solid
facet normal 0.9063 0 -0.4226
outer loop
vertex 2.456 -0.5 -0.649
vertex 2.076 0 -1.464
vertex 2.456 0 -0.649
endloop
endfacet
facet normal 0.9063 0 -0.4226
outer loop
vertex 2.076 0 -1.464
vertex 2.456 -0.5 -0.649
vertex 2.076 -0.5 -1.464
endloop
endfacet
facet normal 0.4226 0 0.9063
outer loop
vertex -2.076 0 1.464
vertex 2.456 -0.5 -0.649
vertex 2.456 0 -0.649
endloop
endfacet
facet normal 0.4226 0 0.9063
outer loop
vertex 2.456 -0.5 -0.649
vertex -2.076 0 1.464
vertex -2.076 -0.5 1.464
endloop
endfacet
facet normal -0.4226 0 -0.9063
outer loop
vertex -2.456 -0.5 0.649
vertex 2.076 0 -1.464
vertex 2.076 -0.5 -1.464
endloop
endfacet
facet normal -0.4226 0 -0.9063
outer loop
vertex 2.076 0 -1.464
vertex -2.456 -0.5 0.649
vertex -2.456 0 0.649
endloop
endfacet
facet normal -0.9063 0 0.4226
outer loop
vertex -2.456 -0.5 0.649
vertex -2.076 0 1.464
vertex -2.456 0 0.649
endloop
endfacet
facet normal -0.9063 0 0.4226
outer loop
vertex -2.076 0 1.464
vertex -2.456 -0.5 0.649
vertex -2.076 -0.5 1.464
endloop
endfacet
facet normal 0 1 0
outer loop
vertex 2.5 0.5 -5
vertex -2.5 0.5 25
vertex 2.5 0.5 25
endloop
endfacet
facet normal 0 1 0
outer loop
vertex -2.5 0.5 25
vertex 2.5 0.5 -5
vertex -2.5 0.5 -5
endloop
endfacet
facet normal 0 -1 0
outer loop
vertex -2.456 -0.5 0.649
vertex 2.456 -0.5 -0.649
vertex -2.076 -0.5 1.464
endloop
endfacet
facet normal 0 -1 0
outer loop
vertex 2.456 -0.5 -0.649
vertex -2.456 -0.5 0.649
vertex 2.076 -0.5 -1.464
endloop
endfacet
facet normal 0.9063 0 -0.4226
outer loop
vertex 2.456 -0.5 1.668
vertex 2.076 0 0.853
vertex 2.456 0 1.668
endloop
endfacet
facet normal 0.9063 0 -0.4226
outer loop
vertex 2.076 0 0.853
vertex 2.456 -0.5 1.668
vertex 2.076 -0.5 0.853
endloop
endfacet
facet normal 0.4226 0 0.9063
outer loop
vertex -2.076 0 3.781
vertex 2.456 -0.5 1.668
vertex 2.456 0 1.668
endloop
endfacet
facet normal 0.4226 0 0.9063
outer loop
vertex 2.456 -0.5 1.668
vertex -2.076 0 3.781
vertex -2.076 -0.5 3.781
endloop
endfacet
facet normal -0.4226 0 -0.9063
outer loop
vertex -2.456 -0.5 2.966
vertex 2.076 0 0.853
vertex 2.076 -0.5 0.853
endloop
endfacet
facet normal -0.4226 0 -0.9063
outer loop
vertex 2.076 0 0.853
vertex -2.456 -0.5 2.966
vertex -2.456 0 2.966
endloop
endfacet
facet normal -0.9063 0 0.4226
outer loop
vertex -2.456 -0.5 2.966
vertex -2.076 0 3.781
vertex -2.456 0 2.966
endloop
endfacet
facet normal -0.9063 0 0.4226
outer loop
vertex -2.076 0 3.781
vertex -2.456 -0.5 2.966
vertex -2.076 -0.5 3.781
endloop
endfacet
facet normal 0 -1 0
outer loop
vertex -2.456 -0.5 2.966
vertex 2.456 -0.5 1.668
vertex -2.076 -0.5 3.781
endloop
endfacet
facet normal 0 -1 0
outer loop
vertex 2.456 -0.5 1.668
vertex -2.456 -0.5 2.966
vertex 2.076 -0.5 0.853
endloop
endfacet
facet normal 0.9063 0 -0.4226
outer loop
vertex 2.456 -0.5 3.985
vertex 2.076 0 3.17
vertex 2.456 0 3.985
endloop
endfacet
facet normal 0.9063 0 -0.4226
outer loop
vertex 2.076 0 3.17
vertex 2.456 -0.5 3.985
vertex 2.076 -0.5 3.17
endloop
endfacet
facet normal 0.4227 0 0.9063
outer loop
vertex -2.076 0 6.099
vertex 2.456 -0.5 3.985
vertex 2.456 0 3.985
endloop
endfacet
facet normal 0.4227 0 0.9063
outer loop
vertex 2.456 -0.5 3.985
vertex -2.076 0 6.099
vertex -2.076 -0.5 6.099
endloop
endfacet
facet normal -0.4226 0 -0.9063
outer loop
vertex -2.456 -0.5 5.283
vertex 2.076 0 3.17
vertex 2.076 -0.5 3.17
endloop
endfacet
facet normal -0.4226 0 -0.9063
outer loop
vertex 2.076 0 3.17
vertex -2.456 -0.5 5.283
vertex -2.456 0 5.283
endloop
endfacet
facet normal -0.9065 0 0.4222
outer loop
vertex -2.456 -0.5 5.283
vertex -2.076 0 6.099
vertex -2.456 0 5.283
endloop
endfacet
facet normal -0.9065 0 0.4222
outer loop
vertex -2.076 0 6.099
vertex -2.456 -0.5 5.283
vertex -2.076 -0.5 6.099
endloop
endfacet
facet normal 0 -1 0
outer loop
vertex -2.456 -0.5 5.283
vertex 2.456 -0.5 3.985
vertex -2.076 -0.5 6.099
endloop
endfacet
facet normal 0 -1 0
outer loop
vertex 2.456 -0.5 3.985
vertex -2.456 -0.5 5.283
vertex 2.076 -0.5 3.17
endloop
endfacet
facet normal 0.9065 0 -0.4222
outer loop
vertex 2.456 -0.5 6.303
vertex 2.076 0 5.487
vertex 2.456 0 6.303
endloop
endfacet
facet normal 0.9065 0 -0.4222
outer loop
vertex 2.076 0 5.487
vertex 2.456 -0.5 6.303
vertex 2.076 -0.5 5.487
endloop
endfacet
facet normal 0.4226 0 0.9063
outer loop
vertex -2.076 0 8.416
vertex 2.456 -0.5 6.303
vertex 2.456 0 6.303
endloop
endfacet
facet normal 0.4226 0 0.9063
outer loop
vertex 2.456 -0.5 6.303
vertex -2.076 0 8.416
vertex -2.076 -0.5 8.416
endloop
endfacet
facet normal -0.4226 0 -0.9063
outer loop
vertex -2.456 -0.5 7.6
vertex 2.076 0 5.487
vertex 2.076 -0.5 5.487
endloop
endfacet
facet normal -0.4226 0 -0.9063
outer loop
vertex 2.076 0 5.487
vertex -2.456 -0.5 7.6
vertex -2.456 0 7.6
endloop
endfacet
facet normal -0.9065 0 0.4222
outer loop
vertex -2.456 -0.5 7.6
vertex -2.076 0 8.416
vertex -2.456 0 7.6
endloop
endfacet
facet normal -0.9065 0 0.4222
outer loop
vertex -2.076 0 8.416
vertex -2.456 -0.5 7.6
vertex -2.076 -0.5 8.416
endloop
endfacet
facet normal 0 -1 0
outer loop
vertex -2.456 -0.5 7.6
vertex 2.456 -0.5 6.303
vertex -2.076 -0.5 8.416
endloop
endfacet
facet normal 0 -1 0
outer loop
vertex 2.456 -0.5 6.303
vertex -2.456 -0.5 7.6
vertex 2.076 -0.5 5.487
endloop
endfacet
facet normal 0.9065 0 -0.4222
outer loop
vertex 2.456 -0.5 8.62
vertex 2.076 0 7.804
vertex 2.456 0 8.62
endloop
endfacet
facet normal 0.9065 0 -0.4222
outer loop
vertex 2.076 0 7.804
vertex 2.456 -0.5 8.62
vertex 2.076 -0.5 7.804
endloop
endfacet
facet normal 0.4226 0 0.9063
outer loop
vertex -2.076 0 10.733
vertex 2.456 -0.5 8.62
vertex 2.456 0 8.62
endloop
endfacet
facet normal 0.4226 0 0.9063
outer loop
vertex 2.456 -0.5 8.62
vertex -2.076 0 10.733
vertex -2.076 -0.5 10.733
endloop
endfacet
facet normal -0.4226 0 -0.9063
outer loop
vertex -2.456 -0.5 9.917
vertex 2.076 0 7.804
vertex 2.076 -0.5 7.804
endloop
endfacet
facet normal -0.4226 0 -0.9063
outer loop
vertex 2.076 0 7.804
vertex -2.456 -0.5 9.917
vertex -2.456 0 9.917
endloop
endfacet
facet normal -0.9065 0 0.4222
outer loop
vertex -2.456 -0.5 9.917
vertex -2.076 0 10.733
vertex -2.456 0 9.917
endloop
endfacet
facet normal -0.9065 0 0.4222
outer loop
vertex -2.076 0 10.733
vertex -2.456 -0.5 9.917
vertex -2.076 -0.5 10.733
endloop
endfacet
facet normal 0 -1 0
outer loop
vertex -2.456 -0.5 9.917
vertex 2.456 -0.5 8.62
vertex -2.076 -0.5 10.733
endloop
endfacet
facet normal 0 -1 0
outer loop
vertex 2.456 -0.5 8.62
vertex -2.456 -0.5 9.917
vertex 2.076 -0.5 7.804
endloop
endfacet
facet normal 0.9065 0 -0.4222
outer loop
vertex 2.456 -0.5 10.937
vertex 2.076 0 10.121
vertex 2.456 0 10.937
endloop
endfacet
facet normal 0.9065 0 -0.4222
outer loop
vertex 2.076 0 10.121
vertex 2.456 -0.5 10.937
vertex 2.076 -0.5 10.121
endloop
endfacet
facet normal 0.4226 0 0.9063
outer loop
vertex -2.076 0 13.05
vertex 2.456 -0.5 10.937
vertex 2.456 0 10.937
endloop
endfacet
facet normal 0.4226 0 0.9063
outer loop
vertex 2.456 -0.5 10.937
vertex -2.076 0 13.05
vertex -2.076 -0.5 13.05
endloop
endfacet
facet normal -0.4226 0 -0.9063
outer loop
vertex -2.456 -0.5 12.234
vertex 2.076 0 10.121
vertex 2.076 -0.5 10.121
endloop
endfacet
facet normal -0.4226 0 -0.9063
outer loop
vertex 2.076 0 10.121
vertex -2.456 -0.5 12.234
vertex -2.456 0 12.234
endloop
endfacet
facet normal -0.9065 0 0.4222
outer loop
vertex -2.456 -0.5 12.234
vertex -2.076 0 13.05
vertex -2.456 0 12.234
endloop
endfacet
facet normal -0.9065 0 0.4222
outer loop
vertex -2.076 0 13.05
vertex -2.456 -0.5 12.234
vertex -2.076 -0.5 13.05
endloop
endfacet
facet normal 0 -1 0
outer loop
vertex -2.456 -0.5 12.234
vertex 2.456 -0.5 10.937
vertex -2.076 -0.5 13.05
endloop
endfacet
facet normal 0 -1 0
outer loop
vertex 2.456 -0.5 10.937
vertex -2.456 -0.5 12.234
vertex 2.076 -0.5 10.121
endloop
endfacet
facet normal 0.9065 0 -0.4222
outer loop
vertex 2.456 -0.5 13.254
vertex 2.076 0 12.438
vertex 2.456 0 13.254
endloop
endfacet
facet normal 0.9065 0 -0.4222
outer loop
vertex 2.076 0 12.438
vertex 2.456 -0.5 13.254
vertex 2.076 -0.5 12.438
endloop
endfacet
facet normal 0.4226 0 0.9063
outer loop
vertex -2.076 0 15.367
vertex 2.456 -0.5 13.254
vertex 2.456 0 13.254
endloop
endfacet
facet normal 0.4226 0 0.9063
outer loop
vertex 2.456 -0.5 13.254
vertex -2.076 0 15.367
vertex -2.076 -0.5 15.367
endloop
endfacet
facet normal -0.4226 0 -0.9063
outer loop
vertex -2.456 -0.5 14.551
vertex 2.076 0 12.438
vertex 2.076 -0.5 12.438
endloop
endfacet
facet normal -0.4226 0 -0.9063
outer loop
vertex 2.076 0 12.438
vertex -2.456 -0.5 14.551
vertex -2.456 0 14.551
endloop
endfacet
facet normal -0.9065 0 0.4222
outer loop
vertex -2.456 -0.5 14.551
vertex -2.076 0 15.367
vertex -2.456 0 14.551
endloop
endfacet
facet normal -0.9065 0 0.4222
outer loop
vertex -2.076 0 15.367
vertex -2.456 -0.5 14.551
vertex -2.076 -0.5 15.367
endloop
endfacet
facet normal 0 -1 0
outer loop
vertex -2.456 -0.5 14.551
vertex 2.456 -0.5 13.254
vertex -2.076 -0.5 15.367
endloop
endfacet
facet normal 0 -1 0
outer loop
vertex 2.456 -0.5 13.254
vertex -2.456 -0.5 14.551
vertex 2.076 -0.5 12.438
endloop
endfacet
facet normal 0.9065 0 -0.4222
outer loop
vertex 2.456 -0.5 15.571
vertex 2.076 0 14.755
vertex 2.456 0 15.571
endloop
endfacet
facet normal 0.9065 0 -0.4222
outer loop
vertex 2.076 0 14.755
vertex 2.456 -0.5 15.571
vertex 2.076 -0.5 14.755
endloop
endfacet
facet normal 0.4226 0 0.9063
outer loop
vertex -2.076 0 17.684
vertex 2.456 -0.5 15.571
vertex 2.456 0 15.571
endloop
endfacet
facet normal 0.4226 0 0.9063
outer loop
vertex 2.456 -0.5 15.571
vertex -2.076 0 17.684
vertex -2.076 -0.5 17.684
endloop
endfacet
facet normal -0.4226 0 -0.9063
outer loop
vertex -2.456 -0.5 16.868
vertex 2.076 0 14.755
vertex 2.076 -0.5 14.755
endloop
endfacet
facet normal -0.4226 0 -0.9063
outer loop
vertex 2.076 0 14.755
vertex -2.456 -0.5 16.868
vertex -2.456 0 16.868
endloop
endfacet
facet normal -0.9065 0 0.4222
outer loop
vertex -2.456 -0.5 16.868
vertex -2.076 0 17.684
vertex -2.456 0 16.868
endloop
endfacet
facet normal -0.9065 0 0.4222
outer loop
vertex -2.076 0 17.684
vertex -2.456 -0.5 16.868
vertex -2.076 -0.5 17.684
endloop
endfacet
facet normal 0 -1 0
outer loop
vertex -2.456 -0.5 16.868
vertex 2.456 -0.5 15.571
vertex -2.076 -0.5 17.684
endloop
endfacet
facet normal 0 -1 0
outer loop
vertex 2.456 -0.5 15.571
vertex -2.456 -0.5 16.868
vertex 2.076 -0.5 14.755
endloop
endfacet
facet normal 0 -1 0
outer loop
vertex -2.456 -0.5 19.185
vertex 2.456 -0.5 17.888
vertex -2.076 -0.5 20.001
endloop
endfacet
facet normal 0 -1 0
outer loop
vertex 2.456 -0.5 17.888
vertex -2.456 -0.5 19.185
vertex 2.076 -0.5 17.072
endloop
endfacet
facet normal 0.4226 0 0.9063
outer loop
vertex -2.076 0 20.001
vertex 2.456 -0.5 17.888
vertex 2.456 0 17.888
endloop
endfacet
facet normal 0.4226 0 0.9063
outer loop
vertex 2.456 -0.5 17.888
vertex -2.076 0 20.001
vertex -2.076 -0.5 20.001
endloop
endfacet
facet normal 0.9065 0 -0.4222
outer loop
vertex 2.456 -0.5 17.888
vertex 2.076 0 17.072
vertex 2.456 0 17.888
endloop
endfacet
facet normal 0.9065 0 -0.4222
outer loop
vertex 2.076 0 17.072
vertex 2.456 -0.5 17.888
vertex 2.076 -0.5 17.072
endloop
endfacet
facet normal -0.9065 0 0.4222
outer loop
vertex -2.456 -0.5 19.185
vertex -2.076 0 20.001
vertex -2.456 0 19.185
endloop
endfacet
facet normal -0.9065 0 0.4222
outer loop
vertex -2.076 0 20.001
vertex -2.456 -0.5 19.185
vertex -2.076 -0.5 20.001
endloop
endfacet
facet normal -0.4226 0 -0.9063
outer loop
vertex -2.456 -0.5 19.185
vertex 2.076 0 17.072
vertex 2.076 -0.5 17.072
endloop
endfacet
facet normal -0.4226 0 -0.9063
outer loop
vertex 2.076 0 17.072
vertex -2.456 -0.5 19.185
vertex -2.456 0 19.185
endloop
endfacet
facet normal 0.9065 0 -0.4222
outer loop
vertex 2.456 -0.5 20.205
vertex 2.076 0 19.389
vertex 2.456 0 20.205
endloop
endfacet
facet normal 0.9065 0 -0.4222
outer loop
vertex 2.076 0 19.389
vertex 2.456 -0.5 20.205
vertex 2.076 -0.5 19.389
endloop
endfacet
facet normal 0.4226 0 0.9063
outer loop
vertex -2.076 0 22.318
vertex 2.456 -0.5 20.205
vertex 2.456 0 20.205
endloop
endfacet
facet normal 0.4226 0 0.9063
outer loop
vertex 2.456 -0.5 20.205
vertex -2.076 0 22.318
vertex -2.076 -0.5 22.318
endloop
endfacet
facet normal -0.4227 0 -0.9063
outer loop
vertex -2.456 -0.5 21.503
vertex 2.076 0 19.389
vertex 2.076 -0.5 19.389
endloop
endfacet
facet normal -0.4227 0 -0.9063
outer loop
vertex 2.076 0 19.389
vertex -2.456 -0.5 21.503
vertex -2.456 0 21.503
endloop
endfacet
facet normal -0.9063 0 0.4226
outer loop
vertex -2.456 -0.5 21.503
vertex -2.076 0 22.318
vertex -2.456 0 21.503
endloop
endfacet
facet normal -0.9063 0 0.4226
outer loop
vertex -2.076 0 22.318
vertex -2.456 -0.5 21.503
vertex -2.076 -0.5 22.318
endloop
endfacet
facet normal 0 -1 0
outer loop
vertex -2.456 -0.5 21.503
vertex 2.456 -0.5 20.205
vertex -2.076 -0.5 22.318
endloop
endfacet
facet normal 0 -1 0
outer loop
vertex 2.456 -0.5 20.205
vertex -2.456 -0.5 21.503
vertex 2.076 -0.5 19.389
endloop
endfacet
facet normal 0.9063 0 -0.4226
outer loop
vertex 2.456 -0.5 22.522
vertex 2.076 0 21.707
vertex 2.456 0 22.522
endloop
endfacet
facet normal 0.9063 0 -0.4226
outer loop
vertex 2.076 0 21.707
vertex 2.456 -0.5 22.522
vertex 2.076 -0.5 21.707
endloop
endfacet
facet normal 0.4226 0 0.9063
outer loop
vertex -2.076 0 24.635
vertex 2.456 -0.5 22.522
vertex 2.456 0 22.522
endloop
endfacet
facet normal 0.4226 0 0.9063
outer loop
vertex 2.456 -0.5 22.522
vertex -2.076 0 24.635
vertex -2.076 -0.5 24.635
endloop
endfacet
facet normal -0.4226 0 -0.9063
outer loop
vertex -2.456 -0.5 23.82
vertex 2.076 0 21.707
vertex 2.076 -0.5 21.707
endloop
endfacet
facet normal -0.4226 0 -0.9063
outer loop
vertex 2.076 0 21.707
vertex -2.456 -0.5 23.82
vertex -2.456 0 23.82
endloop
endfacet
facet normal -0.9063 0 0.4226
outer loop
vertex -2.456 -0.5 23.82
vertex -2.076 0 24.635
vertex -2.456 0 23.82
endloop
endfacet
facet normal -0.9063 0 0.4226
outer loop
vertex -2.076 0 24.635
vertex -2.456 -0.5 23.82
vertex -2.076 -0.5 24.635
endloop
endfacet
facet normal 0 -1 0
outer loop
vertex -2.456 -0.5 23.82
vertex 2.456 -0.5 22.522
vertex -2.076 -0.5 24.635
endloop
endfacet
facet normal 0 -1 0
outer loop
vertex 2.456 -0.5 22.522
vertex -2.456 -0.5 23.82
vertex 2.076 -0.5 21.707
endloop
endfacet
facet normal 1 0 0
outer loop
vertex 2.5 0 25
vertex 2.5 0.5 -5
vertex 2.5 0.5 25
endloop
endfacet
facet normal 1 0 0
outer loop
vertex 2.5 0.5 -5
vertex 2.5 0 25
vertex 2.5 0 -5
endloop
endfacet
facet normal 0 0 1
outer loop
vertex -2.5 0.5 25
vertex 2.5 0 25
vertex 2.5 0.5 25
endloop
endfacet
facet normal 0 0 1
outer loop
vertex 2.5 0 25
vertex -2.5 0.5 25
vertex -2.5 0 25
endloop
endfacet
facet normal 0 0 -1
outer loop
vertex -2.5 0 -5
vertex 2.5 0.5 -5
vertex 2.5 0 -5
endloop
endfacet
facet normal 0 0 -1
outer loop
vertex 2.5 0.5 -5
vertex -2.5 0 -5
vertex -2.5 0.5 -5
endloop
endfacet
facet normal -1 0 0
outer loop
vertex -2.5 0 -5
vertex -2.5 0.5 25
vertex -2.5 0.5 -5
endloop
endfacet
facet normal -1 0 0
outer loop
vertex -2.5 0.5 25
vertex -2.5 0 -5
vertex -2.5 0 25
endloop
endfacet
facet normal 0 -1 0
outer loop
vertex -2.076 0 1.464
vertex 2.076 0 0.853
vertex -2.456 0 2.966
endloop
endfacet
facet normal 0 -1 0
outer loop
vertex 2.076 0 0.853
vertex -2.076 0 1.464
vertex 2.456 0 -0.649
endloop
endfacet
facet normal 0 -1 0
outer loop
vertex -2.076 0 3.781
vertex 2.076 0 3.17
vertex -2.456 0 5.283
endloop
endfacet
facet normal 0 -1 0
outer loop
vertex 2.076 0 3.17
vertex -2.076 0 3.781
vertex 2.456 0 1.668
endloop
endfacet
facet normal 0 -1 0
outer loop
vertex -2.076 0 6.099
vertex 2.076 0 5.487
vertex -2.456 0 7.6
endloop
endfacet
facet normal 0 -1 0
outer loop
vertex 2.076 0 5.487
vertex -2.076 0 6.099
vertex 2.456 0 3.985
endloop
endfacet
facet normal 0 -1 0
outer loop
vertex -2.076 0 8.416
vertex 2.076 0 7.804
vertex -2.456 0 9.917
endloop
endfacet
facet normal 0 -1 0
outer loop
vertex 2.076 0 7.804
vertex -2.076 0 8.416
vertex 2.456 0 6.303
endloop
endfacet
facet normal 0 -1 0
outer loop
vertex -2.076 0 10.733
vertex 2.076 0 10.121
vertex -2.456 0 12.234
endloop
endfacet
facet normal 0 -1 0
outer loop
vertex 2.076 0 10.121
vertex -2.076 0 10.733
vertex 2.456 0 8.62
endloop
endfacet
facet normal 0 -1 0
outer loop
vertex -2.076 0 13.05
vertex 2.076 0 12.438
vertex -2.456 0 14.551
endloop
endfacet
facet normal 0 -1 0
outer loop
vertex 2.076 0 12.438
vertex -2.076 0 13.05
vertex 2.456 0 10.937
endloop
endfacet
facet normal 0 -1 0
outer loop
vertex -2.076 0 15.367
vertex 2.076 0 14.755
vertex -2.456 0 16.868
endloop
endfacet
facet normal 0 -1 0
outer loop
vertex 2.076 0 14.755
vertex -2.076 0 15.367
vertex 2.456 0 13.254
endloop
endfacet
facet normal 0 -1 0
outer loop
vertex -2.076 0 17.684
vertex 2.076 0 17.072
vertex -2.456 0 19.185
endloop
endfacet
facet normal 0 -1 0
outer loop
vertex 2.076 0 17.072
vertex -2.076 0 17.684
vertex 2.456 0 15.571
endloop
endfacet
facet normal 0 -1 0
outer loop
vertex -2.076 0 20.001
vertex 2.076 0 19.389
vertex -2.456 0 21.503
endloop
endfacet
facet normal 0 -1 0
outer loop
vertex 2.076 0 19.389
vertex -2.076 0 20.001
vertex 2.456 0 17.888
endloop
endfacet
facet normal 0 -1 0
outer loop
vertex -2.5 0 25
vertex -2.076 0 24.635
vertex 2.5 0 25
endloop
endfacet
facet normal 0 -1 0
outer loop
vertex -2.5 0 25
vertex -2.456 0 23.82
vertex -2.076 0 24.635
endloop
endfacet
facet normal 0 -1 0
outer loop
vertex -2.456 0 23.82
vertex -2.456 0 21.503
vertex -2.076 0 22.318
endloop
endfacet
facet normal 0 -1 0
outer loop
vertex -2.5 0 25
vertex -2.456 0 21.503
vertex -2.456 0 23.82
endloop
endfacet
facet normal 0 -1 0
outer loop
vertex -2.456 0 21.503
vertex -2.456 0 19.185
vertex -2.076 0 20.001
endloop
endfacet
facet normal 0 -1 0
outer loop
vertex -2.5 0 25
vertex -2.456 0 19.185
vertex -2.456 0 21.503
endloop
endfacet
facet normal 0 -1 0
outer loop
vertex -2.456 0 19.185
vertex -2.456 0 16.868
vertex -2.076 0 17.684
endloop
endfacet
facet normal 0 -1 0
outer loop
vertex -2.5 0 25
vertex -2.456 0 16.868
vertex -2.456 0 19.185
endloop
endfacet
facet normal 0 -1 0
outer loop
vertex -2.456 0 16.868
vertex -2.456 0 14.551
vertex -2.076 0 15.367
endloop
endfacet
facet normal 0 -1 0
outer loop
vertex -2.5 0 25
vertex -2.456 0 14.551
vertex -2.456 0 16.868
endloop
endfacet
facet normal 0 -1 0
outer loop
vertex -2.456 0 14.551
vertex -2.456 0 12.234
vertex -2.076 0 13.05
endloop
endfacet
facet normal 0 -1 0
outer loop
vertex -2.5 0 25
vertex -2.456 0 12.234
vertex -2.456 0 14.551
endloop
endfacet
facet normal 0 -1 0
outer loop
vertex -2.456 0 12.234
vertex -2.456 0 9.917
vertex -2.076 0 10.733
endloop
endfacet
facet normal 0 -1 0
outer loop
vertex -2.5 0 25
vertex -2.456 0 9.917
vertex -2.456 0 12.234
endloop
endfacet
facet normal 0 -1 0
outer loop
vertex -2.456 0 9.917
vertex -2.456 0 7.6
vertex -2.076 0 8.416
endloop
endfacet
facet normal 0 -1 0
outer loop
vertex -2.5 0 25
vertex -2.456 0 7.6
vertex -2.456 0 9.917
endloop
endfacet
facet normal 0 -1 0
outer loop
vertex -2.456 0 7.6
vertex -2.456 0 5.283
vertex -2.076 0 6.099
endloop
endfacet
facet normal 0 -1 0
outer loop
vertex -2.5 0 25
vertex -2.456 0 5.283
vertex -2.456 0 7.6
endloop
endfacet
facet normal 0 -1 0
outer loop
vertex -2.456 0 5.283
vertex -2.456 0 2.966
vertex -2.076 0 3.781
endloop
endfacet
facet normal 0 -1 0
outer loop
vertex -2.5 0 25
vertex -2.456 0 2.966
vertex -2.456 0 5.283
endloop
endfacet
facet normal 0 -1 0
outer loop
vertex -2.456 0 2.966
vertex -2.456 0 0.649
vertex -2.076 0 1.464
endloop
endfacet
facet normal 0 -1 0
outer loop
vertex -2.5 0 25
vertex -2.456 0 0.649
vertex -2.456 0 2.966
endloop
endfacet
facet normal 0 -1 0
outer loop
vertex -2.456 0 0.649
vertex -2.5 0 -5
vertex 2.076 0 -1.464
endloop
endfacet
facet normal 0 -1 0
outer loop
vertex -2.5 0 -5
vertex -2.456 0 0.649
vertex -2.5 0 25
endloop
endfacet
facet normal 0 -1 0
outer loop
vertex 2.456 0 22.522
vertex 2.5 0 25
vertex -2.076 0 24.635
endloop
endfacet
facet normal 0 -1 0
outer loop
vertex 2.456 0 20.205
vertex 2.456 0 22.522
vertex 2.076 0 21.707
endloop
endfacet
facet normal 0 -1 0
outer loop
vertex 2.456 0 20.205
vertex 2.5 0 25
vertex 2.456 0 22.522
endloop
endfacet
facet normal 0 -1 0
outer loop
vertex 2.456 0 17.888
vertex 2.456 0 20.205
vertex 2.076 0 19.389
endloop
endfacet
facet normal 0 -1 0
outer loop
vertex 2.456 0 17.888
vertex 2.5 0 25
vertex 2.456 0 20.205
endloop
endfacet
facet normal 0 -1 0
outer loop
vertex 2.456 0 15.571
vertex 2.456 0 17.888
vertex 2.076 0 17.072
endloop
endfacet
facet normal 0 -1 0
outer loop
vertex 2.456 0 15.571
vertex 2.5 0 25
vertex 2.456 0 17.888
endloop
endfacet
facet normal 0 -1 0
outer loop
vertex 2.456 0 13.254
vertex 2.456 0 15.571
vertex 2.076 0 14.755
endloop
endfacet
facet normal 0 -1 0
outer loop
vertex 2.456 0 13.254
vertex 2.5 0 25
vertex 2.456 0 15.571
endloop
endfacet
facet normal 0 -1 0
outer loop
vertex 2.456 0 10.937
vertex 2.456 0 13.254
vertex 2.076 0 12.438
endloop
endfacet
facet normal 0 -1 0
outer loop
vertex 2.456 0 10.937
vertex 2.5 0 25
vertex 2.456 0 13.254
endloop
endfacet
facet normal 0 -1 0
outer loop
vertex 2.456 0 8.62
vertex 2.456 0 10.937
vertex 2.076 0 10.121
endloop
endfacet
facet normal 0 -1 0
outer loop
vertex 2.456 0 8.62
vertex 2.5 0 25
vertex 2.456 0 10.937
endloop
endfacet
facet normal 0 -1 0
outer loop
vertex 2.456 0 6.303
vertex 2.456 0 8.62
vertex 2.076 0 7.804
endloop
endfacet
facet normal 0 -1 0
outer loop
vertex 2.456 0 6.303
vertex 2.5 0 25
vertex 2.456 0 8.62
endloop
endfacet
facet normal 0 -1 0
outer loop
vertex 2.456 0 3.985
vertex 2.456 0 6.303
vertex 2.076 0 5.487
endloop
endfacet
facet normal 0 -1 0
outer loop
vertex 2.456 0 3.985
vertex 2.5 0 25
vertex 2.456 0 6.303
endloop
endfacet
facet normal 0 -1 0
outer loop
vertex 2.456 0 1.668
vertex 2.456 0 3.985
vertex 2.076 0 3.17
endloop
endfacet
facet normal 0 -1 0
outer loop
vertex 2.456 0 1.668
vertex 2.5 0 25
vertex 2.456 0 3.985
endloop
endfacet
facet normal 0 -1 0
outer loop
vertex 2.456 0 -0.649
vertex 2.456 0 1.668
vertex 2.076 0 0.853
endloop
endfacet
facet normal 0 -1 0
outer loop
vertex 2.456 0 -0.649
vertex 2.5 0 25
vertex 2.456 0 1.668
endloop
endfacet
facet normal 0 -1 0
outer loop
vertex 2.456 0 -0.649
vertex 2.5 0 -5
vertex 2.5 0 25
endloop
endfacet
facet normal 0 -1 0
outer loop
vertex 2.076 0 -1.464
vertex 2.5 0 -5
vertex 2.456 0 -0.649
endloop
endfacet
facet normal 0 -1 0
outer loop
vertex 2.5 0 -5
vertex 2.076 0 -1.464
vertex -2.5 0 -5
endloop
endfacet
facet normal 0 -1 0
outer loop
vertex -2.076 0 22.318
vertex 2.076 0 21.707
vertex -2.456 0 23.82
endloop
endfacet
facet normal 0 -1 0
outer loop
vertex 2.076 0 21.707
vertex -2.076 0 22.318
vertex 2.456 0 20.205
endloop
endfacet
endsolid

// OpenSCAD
module grooves(t1, t2, angle, length, width, depth){
    for(i=[0:length]){
        let(dz=(t1+t2)/(sin(90-angle)),x=0,y=0,z=0)
        let()
        translate([x,y,z+dz*i])rotate([0,angle,0])cube([width,depth,t1],center=true);
    }
    
}

grooves(0.9, 1.2, 25, length=10, width=5, depth=1);
translate([-2.5,0,-5])cube([5,0.5,30]);
